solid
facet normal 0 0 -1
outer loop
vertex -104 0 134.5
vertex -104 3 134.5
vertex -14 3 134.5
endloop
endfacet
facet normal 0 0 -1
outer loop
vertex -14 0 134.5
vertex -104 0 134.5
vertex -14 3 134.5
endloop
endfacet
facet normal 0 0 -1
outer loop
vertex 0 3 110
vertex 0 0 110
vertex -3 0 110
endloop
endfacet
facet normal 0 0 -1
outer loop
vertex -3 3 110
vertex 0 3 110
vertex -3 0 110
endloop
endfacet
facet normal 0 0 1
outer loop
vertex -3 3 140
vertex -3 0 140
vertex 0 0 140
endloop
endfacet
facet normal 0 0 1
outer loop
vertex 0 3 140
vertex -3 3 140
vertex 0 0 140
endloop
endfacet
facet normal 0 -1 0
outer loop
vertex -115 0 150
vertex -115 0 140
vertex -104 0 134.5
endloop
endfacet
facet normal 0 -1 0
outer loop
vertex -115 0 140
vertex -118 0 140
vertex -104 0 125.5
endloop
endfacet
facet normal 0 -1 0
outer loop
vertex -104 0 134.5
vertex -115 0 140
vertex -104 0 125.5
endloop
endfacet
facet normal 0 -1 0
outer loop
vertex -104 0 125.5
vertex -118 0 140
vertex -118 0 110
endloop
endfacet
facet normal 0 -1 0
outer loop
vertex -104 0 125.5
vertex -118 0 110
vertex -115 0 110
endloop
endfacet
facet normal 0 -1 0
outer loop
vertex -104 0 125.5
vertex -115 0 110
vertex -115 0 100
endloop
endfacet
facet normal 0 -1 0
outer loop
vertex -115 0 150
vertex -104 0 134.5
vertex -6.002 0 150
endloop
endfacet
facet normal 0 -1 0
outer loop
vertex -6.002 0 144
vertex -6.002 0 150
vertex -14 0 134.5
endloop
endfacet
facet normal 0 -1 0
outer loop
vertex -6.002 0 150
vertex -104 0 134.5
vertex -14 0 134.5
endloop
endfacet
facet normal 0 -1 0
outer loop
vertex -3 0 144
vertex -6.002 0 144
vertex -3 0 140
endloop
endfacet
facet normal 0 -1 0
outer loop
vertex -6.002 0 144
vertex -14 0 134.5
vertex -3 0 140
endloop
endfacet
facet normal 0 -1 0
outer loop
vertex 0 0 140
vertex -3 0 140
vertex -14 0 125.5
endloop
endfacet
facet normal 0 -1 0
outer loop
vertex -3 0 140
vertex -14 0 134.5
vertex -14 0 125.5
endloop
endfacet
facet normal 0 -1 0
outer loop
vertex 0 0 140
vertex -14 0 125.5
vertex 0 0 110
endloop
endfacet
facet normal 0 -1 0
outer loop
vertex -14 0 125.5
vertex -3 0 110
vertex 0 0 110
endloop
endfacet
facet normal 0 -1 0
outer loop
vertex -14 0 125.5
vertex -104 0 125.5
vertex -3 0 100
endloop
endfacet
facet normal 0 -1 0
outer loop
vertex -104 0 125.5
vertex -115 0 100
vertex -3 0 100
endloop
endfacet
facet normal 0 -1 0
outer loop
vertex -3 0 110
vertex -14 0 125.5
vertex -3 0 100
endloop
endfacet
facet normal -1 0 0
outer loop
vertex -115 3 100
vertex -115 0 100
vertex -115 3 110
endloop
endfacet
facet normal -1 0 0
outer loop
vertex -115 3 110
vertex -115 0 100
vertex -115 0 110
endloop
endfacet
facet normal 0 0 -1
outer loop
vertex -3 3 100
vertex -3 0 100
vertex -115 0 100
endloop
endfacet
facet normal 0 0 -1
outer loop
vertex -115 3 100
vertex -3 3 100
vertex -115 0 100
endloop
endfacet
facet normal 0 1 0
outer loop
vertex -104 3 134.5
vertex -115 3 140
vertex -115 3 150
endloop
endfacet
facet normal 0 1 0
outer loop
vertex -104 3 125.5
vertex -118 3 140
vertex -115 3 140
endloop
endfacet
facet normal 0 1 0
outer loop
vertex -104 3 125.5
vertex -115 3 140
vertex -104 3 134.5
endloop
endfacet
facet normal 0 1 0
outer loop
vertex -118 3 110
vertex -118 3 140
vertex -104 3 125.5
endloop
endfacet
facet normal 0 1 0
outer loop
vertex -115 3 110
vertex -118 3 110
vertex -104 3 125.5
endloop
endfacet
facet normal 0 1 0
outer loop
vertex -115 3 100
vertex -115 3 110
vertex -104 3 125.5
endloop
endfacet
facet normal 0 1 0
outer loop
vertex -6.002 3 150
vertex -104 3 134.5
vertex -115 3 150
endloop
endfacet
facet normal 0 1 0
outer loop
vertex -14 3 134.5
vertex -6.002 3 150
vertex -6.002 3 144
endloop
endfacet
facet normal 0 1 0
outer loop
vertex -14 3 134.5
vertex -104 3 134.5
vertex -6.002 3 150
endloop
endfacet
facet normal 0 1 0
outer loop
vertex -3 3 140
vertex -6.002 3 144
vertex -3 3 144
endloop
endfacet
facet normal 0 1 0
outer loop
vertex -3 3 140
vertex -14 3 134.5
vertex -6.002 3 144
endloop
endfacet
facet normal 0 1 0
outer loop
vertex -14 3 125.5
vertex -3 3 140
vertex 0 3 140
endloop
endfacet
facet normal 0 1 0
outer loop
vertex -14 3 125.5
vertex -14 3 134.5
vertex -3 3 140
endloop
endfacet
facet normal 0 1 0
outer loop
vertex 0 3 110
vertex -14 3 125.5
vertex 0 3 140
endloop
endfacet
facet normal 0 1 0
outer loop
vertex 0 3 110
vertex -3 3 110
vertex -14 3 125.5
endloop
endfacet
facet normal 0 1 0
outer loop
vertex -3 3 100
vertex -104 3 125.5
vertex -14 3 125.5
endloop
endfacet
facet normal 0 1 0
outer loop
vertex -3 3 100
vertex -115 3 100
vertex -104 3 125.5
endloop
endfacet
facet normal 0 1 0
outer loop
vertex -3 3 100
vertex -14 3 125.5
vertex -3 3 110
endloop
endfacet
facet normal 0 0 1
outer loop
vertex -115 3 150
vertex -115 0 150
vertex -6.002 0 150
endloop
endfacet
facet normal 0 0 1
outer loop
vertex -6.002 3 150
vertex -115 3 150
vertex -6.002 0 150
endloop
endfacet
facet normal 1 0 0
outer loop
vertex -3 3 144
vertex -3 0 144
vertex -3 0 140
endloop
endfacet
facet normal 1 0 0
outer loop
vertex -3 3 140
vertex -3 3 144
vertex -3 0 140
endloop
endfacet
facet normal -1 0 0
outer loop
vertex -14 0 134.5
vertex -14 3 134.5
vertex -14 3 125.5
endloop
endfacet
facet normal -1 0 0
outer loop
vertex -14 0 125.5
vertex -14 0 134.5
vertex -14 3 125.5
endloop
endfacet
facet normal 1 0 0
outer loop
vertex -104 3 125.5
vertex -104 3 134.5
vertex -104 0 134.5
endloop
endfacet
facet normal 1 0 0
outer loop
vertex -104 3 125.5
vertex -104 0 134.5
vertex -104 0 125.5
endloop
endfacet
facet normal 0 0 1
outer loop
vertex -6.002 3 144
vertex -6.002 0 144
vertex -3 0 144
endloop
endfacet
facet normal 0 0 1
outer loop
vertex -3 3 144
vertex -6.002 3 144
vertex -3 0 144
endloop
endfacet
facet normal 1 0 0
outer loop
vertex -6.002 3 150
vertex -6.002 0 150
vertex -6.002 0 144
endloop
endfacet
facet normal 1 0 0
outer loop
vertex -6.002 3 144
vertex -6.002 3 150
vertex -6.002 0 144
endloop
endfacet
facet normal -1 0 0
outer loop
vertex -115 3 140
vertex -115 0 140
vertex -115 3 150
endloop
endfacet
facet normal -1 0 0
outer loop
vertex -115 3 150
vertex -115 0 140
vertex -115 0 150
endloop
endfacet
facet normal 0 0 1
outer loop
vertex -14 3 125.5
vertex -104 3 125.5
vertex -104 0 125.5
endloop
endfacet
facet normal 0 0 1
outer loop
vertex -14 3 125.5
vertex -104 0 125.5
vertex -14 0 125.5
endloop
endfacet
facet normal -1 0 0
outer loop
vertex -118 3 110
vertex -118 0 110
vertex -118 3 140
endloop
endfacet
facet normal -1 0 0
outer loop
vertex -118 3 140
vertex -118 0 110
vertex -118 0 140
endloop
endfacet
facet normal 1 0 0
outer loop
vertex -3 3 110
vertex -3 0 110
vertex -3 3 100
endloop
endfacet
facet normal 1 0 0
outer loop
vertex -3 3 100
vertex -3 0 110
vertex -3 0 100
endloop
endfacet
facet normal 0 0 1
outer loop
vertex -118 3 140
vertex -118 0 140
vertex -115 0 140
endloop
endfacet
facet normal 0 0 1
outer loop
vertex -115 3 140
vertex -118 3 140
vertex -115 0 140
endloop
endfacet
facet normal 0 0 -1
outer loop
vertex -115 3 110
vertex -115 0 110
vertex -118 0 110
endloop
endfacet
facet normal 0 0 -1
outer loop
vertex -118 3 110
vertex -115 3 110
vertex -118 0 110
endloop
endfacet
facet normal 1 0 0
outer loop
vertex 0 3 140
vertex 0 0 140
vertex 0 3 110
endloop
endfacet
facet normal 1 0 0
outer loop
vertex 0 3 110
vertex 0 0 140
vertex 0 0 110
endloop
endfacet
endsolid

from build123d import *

# Parameters (mm, degrees)
LED_1_OUTLINE_R     = 2.25
LED_1_DEPTH         = 3
SKETCH_1_W          = 90
SKETCH_1_H          = 9
CUT_EXTRUDE_1_DEPTH = 3


# Read off the part's stored shape, not the designer's step: 基体零件-LED板-1
with BuildPart() as part:
    # 基体零件-LED板-1 outline → 基体零件-LED板-1 (new body)
    with BuildSketch(Plane(origin=(0, 0, 0), x_dir=(1, 0, 0), z_dir=(0, 1, 0))):
        Polygon((-3, -140), (0, -140), (0, -110), (-3, -110), (-3, -100), (-115, -100), (-115, -110), (-118, -110), (-118, -140), (-115, -140), (-115, -150), (-6.001970153, -150), (-6.001970153, -144), (-3, -144), align=None)
        with Locations((-90.5, -130)):
            Circle(LED_1_OUTLINE_R, mode=Mode.SUBTRACT)
        with Locations((-81.5, -130)):
            Circle(LED_1_OUTLINE_R, mode=Mode.SUBTRACT)
        with Locations((-72.5, -130)):
            Circle(LED_1_OUTLINE_R, mode=Mode.SUBTRACT)
        with Locations((-63.5, -130)):
            Circle(LED_1_OUTLINE_R, mode=Mode.SUBTRACT)
        with Locations((-54.5, -130)):
            Circle(LED_1_OUTLINE_R, mode=Mode.SUBTRACT)
        with Locations((-45.5, -130)):
            Circle(LED_1_OUTLINE_R, mode=Mode.SUBTRACT)
        with Locations((-36.5, -130)):
            Circle(LED_1_OUTLINE_R, mode=Mode.SUBTRACT)
        with Locations((-27.5, -130)):
            Circle(LED_1_OUTLINE_R, mode=Mode.SUBTRACT)
    extrude(amount=LED_1_DEPTH)

    # 草图1 → 切除-拉伸1 (cut)
    with BuildSketch(Plane(origin=(0, 3, 0), x_dir=(1, 0, 0), z_dir=(0, 1, 0))):
        with Locations((-59, -130)):
            Rectangle(SKETCH_1_W, SKETCH_1_H)
    extrude(amount=-CUT_EXTRUDE_1_DEPTH, mode=Mode.SUBTRACT)


solid = part.part
